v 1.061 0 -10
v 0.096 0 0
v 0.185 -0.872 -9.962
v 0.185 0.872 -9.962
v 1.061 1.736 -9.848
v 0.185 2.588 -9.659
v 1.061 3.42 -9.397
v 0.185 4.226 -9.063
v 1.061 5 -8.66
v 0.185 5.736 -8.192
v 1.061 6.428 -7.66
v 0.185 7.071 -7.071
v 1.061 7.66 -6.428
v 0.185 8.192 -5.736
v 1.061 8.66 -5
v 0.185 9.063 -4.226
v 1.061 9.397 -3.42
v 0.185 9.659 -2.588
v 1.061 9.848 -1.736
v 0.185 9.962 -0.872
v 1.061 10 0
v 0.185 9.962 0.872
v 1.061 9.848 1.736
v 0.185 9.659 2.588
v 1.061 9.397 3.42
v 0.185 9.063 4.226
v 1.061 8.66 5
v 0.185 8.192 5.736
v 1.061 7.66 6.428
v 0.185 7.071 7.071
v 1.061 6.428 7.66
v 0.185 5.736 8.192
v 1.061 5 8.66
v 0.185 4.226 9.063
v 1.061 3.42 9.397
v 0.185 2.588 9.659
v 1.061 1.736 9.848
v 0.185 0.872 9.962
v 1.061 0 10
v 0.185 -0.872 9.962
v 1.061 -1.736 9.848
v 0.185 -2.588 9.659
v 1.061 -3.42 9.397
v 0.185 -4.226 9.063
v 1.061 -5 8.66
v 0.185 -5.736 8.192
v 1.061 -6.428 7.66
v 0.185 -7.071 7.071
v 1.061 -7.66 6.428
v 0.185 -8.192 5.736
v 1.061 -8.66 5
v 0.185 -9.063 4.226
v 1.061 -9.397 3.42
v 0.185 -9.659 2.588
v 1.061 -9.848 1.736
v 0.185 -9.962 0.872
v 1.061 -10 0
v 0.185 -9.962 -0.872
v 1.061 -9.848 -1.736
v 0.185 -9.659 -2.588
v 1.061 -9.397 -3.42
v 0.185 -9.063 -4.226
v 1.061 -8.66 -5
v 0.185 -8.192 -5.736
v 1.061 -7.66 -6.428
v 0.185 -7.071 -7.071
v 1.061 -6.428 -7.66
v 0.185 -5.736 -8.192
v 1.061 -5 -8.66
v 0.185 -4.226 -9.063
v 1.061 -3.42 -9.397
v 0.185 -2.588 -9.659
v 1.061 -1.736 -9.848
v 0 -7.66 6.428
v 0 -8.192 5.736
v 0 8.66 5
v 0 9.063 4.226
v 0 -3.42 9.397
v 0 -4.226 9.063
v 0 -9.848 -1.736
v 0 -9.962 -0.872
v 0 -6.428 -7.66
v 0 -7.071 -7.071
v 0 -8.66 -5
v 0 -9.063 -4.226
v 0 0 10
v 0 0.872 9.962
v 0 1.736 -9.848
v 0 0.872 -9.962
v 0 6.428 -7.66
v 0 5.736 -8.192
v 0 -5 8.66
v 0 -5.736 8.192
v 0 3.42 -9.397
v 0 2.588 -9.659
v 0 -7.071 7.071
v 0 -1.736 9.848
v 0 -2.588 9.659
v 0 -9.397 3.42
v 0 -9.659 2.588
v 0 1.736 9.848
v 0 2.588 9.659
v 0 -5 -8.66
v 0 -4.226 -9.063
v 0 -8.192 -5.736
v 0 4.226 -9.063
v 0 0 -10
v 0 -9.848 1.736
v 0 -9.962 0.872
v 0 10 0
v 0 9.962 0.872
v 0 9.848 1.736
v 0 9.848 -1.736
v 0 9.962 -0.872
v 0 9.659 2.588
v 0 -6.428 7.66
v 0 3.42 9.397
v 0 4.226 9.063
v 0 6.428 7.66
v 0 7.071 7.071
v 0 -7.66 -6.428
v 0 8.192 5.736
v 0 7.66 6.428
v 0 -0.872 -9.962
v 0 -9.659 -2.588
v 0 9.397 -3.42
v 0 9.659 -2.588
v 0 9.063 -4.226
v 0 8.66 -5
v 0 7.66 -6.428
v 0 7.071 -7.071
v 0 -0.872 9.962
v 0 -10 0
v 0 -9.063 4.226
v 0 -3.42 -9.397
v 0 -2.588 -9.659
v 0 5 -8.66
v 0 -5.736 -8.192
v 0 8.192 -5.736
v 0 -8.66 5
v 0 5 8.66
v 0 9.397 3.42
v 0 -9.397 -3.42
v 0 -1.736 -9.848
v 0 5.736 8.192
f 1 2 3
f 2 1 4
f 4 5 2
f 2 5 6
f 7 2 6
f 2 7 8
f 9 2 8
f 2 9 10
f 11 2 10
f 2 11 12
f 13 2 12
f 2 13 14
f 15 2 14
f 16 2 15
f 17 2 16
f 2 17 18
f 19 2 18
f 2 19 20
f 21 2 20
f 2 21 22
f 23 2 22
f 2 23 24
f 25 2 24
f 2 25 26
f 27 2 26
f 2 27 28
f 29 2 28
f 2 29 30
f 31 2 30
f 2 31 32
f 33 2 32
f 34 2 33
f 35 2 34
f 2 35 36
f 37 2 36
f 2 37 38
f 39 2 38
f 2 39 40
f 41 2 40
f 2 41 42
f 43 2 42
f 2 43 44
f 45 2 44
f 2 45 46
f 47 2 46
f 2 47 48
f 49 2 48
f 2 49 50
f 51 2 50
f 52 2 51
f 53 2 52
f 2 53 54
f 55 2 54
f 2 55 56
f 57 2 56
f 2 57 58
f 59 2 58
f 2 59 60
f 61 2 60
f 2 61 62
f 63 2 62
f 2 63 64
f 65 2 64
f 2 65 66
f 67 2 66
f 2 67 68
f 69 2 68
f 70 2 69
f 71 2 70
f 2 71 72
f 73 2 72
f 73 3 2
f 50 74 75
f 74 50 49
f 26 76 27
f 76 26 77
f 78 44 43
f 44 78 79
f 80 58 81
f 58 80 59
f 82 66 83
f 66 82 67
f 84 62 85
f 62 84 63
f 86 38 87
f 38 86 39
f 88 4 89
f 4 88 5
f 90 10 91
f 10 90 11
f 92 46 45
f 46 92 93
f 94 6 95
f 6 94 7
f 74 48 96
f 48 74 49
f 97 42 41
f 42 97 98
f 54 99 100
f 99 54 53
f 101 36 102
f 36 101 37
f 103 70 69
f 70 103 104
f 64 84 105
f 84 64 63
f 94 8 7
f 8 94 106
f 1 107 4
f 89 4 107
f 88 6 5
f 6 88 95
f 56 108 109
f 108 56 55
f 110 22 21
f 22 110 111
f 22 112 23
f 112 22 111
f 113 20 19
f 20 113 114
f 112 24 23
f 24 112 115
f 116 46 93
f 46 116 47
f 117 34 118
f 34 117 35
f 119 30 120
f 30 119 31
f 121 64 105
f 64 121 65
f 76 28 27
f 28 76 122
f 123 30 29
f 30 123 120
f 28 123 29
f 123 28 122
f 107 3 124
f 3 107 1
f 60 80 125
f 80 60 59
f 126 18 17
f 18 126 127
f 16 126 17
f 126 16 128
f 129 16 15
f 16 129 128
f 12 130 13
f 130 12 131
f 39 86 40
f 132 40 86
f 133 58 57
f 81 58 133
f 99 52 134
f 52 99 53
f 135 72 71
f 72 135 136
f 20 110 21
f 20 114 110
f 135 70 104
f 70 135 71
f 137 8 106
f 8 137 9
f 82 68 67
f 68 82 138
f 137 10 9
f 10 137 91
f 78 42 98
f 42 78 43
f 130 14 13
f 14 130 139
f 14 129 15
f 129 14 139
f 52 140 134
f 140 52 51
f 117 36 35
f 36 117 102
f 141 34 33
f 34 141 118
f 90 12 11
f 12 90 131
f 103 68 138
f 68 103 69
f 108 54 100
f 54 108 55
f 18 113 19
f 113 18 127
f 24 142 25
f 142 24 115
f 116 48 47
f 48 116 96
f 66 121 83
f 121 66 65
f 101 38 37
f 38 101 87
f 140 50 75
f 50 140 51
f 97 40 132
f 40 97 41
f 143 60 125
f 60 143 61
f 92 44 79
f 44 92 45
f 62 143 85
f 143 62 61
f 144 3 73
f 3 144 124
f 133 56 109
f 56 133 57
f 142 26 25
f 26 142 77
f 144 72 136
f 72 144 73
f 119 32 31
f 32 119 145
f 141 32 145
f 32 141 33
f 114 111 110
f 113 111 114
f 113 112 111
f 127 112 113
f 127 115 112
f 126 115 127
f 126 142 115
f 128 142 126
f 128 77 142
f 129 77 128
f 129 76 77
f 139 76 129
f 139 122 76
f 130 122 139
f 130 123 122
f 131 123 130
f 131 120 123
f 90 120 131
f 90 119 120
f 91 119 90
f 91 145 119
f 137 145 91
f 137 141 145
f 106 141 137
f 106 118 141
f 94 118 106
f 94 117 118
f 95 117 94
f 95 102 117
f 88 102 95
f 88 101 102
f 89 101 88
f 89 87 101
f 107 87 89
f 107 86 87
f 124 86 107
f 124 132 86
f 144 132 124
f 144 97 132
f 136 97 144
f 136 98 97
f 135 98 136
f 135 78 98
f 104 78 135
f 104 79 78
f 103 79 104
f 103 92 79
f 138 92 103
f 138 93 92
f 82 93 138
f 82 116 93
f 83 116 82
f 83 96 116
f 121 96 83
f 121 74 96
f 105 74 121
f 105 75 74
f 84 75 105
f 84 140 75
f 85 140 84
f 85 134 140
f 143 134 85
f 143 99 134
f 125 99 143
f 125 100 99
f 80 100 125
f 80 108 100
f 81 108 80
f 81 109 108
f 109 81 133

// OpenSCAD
serrated();

module serrated() {
  intersection() {
    step = 36;
    union() {
      for(i = [0:step]) {
        rotate([i * 360 / step, 0, 0])
          translate([0, 0, -10]) {
            linear_extrude(11, scale = [0, 0]) {
              rotate([0, 0, 45])
                square(1.5, center = true);
            }
          }
      }
    }
    rotate([0, 90, 0])
      cylinder(r = 10, h = 2, $fn = step * 2);
  }
}
